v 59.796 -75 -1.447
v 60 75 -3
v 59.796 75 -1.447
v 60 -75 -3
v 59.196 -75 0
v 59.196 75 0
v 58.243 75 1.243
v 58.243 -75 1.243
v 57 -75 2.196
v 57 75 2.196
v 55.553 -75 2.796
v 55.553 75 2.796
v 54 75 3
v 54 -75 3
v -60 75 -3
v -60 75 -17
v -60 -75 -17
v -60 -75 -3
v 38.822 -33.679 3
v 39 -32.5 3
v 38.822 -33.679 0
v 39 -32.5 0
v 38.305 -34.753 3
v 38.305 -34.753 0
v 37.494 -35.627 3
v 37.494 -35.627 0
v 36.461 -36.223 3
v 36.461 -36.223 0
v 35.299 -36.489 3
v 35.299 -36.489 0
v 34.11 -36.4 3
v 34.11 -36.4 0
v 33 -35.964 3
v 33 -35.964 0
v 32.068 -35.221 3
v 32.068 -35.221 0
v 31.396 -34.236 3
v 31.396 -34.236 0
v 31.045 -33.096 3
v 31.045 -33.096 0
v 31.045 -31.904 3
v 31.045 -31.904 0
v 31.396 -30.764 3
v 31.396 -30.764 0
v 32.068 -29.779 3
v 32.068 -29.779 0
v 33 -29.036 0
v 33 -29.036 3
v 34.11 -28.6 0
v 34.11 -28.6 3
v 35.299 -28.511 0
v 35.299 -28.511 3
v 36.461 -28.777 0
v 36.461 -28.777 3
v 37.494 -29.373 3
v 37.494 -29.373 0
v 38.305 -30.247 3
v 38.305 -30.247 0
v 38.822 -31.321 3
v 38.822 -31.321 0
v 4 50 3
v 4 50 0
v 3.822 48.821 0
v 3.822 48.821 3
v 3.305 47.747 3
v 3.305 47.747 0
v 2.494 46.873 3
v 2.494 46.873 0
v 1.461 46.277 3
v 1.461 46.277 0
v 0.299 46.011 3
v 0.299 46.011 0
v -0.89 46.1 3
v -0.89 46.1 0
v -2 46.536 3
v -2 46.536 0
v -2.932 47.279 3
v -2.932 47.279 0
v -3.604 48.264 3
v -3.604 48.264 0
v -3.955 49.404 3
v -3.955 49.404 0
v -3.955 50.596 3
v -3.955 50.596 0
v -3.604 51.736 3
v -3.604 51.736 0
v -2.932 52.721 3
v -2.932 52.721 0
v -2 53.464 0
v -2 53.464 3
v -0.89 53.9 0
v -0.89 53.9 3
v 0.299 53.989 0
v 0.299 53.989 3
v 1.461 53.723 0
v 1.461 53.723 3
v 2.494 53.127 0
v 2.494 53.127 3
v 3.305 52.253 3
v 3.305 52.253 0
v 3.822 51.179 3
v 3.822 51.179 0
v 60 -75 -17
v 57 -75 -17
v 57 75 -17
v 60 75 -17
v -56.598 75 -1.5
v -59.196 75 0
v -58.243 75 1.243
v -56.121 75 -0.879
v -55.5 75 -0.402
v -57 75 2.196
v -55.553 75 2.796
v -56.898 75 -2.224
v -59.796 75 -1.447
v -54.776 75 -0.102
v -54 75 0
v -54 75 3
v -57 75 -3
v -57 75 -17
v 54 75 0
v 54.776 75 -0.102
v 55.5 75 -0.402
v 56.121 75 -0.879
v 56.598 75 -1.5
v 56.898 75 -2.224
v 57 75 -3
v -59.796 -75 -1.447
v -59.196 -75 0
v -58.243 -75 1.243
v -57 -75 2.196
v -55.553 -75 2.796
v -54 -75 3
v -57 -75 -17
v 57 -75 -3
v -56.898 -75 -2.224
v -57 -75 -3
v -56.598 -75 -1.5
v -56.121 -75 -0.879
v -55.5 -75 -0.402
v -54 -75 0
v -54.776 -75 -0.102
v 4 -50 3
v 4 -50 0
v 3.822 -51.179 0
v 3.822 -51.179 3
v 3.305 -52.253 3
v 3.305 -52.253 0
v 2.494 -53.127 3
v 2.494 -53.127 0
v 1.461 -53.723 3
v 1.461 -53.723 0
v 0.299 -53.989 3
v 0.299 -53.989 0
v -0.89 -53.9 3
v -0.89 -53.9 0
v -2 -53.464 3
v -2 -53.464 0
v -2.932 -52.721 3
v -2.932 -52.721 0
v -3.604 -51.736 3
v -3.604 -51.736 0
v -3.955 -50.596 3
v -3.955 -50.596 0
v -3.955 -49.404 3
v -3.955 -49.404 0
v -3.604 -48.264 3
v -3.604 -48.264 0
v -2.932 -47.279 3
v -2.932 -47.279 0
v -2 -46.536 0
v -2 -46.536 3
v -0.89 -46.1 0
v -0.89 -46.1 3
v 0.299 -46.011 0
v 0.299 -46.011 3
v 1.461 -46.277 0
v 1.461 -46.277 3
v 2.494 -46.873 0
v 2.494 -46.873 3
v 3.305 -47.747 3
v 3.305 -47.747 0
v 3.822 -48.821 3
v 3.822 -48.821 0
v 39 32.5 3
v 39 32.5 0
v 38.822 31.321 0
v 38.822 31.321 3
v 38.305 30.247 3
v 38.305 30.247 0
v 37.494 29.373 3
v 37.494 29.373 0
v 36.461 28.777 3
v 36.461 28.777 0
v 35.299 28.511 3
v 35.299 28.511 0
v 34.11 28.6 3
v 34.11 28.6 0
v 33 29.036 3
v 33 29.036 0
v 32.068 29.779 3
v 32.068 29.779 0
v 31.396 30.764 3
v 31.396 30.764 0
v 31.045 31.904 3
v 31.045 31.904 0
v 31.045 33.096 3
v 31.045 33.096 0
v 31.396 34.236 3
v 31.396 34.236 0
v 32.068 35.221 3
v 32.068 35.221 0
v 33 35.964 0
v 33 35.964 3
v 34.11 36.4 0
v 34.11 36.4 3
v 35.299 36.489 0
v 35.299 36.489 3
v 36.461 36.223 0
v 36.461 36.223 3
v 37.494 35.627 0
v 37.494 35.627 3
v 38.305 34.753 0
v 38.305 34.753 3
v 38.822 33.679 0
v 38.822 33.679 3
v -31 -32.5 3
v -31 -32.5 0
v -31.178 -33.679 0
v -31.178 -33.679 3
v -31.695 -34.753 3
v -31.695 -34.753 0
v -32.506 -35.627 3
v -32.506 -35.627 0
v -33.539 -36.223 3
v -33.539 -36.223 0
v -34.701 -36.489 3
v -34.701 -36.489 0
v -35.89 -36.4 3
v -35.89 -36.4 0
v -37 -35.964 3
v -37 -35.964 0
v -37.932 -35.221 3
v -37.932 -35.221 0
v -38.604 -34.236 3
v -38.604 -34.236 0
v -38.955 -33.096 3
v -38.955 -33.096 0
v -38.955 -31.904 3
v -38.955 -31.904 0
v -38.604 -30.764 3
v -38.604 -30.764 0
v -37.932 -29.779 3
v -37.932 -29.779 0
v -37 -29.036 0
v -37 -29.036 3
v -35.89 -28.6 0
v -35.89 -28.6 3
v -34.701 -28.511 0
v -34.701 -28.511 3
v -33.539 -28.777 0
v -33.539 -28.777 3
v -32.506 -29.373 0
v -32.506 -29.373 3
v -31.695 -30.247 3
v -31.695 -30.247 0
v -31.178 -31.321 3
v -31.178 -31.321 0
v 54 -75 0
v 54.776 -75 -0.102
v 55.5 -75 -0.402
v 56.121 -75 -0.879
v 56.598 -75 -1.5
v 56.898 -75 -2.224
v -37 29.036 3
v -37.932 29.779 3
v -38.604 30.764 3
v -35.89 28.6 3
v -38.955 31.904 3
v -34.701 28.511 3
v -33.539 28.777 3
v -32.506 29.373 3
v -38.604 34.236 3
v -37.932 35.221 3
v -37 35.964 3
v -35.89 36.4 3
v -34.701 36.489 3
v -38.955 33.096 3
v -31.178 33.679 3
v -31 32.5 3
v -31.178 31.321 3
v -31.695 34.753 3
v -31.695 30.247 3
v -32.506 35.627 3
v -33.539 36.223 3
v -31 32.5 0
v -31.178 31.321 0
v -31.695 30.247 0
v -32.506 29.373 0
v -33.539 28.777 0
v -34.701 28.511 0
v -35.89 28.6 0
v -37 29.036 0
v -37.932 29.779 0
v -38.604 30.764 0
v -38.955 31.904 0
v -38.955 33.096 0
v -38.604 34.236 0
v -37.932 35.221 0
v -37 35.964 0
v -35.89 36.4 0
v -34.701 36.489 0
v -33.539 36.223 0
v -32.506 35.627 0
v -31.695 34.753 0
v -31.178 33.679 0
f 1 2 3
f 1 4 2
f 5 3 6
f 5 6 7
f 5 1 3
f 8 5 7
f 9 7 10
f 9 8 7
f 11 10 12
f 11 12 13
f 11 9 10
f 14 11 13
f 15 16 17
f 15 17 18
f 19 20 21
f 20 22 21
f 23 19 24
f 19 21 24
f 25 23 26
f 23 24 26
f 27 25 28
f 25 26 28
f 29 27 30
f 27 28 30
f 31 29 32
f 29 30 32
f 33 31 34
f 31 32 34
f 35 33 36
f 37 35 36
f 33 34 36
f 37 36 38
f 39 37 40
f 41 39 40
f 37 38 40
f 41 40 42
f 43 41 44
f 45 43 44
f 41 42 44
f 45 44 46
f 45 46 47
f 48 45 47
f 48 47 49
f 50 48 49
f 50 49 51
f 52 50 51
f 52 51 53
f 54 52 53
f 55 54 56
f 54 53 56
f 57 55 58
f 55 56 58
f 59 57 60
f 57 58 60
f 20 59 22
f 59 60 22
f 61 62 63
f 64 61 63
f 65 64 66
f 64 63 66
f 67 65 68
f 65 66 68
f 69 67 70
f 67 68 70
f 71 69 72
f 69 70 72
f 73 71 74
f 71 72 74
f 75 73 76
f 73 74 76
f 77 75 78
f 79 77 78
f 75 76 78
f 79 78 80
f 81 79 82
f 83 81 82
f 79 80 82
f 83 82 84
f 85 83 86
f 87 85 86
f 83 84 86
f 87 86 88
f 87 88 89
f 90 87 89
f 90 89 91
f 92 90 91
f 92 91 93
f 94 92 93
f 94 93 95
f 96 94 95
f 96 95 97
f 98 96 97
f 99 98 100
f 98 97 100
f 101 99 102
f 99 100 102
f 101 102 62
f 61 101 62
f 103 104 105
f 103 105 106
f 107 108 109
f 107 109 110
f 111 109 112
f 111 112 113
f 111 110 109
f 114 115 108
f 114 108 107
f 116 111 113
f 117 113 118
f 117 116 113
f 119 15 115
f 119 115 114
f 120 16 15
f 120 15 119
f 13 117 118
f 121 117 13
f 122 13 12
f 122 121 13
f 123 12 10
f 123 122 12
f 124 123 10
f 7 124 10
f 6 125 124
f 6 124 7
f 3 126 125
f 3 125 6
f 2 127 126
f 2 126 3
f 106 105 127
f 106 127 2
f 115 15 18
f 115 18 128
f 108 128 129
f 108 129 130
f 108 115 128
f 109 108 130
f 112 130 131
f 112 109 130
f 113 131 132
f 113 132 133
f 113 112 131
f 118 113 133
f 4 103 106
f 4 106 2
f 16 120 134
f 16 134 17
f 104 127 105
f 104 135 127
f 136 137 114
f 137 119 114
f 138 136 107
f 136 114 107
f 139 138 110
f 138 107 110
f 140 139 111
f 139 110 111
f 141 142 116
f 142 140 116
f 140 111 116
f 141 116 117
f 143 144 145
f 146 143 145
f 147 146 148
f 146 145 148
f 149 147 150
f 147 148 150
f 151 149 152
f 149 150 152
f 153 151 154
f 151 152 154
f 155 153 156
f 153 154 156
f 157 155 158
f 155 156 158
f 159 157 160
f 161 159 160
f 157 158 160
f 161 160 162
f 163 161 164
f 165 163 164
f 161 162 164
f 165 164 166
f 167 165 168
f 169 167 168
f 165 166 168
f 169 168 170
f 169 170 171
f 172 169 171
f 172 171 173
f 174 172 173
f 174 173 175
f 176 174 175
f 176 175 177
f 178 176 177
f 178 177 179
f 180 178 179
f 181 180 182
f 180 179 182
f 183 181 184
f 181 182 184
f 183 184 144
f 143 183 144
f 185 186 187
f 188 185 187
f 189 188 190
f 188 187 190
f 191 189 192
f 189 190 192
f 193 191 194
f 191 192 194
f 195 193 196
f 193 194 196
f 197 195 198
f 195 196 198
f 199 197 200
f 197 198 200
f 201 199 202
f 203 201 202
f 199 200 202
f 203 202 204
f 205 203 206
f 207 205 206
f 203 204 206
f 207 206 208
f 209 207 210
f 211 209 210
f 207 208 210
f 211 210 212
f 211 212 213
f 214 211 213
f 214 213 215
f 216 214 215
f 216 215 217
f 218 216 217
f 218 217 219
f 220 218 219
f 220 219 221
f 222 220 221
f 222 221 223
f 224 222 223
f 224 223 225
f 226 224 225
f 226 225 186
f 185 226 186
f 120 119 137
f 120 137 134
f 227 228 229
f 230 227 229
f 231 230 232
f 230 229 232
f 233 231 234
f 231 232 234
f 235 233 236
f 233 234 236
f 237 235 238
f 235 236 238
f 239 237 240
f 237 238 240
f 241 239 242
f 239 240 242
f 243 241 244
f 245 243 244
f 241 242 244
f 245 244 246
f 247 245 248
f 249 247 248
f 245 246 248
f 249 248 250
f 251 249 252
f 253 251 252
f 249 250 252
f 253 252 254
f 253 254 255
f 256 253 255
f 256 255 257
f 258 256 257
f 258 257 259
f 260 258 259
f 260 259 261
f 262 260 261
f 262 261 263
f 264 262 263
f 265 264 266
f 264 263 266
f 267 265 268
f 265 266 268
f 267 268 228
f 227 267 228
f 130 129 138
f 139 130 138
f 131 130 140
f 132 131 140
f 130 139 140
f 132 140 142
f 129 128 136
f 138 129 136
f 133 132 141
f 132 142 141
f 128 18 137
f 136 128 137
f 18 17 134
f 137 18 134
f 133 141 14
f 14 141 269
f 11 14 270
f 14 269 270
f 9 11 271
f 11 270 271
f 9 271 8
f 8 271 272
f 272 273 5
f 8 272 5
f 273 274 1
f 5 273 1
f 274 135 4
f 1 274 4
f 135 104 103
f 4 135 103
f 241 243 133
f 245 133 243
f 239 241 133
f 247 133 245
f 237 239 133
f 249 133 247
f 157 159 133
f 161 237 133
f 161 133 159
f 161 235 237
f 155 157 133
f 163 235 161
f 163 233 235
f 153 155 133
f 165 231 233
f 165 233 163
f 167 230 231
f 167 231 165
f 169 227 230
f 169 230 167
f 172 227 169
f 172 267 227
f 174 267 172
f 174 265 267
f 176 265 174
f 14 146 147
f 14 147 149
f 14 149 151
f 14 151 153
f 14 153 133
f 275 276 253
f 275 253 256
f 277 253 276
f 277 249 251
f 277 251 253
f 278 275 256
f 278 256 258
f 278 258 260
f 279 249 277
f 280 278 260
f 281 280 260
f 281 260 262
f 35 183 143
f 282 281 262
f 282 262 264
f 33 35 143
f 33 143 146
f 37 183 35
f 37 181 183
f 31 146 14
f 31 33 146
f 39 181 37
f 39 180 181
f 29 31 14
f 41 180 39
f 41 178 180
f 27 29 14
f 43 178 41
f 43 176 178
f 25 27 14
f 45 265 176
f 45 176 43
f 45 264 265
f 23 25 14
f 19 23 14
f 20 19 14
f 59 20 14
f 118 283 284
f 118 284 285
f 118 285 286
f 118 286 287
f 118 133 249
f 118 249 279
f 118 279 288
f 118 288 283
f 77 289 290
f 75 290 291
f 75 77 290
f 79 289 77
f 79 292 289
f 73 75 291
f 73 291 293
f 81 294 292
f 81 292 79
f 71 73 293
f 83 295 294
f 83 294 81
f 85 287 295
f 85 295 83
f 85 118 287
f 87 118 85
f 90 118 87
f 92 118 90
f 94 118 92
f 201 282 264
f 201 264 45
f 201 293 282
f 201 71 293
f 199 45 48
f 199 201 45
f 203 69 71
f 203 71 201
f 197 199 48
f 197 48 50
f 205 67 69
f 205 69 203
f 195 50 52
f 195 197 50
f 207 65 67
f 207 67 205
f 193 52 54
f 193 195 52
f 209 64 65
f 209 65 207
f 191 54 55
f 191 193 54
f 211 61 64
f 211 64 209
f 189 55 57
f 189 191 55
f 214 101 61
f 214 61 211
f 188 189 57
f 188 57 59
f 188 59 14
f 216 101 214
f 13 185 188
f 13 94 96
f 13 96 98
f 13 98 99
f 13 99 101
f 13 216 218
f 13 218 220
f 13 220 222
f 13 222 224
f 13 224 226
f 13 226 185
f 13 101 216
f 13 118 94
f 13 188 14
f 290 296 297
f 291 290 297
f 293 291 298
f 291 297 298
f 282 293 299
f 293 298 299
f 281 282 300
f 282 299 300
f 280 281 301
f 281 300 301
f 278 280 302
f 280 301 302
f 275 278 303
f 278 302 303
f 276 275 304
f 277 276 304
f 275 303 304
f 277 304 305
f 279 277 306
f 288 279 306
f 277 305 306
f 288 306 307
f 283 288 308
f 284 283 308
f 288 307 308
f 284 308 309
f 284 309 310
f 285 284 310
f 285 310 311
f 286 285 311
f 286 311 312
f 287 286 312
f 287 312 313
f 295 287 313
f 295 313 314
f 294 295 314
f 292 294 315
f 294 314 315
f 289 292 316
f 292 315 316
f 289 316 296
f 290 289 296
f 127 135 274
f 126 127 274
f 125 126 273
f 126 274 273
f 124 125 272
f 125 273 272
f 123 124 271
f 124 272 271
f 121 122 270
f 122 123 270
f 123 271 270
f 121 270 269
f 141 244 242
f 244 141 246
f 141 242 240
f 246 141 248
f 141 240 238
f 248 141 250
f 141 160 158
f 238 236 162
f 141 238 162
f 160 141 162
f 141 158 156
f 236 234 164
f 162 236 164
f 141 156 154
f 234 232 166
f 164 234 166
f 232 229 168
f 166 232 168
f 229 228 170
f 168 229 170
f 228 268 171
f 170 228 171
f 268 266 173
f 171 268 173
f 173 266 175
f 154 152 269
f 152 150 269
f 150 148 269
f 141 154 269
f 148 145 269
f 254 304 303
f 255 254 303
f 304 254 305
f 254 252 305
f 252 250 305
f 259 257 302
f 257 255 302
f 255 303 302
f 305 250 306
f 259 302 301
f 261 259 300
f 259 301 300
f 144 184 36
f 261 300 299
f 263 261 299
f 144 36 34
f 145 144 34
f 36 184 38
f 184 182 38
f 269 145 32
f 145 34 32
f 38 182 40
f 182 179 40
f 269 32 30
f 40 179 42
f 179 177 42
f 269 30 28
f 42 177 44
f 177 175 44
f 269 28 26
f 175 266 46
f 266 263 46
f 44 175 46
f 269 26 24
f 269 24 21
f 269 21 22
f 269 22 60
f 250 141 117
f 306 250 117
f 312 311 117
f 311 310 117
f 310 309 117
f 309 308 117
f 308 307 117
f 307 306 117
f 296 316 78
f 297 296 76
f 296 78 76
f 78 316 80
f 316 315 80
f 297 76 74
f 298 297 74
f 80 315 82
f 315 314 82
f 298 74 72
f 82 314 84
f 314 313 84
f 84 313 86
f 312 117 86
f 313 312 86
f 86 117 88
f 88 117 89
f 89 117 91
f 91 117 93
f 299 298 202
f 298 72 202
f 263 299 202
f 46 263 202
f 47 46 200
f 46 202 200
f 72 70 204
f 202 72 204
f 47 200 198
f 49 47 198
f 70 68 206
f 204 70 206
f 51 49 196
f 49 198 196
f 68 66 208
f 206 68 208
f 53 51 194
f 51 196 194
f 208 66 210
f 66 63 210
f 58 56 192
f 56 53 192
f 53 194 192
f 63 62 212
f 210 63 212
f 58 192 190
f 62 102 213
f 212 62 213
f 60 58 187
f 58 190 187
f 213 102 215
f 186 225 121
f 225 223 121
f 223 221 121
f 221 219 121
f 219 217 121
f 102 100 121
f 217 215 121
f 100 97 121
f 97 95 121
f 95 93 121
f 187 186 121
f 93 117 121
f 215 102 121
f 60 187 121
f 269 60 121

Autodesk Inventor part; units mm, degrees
ref_plane "YZ Plane" through (0, 0, 0) normal (1, 0, 0) x (0, 1, 0)
ref_plane "XZ Plane" through (0, 0, 0) normal (0, 1, 0) x (-1, 0, 0)
ref_plane "XY Plane" through (0, 0, 0) normal (0, 0, 1) x (1, 0, 0)
sketch "Sketch1" plane through (0, 0, 0) normal (0, 0, 1) x (1, 0, 0)
  line L0 (60, -75) -> (-60, -75)
  line L1 (-60, -75) -> (-60, 75)
  line L2 (-60, 75) -> (60, 75)
  line L3 (60, 75) -> (60, -75)
  line L4 (60, 75) -> (-60, -75) construction
  point P0 (0, 0)
  point P1 (0, 0)
  dimension "d1" = 150
  dimension "d2" = 120
extrude "Plate1" add sketch "Sketch1" along normal blind 3
sketch "Sketch2" plane through (0, 0, 0) normal (0, 0, 1) x (1, 0, 0)
  circle A0 centre (0, 0) radius 17.5
  line L0 (35, -32.5) -> (-35, -32.5) construction
  line L1 (-35, -32.5) -> (-35, 32.5) construction
  line L2 (-35, 32.5) -> (35, 32.5) construction
  line L3 (35, 32.5) -> (35, -32.5) construction
  line L4 (35, -32.5) -> (-35, 32.5) construction
  line L5 (-35, -32.5) -> (35, 32.5) construction
  circle A1 centre (-35, -32.5) radius 4
  circle A2 centre (35, -32.5) radius 4
  circle A3 centre (35, 32.5) radius 4
  circle A4 centre (-35, 32.5) radius 4
  circle A5 centre (0, 50) radius 4
  circle A6 centre (0, -50) radius 4
  line L6 (35, 0) -> (-35, 0) construction
  point P0 (75, 0)
  point P1 (0, 0)
  dimension "d3" = 35
  dimension "d4" = 70
  dimension "d5" = 65
  dimension "d7" = 8
  dimension "d32" = 100
extrude "Extrusion1" cut sketch "Sketch2" along normal through all contours A1 | A2 | A3 | A4 | A5 | A6
sketch "Sketch3" plane through (-57, 75, 3) normal (-1, 0, 0) x (0, -1, 0)
  line L0 (150, 0) -> (0, 0)
  line L1 (0, 0) -> (0, -20)
  line L2 (0, -20) -> (150, -20)
  line L3 (150, -20) -> (150, 0)
edge flange "Flange1" height 20 angle 90 thickness 3 bend radius 3 thickness toward (-1, 0, 0) relief tear relief width 3 relief depth 1.5 corner gap 3 corner form 0 edges at (-60, 0, 0) (60, 0, 0) wall of the first edge with corners at (-57, -75, 3) (-57, 75, 3) (-57, 75, -17) (-57, -75, -17)
bend "Bend1"
corner "Corner1"
sketch "Sketch4" plane through (0, 0, 0) normal (0, 0, 1) x (1, 0, 0)
  circle A0 centre (0, 75) radius 17.5 projected
  line L0 (0, 125) -> (0, 105) construction
  line L1 (-3, 125) -> (-3, 105)
  line L2 (3, 105) -> (3, 125)
  arc A1 (3, 125) -> (-3, 125) centre (0, 125) ccw
  arc A2 (-3, 105) -> (3, 105) centre (0, 105) ccw
  arc A3 (34.641, 95) -> (20, 109.641) centre (0, 75) ccw construction
  arc A4 (37.2391, 96.5) -> (21.5, 112.2391) centre (0, 75) ccw
  arc A5 (32.0429, 93.5) -> (18.5, 107.0429) centre (0, 75) ccw
  arc A6 (32.0429, 93.5) -> (37.2391, 96.5) centre (34.641, 95) ccw
  arc A7 (21.5, 112.2391) -> (18.5, 107.0429) centre (20, 109.641) ccw
  line L3 (0, 75) -> (20, 109.641) construction
  line L4 (0, 75) -> (40, 75) construction
  line L5 (0, 75) -> (34.641, 95) construction
  point P0 (0, 0)
  point P1 (0, 115)
  dimension "d20" = 20
  dimension "d21" = 6
  dimension "d22" = 30
  dimension "d23" = 60
  dimension "d24" = 30
  dimension "d25" = 6
  dimension "d26" = 40
extrude "Extrusion2" [suppressed]
pattern_circular "Circular Pattern1" [suppressed]
equation "\"d0\" = Thickness"
equation "\"d10\" = BendReliefWidth"
equation "\"d11\" = BendReliefDepth"
equation "\"d12\" = MinimumRemnant"
equation "\"d13\" = TransitionRadius"
equation "\"d16\" = BendRadius"
equation "\"d17\" = CornerReliefSize"
equation "\"d18\" = GapSize"
equation "\"d19\" = JacobiRadiusSize"
equation "\"BendRadius\" = Thickness"
equation "\"BendReliefWidth\" = Thickness"
equation "\"BendReliefDepth\" = 0.5 * Thickness"
equation "\"CornerReliefSize\" = 4 * Thickness"
equation "\"MinimumRemnant\" = 2 * Thickness"
equation "\"TransitionRadius\" = BendRadius"
equation "\"JacobiRadiusSize\" = BendRadius"
equation "\"GapSize\" = Thickness"
equation "\"Thickness\" = 3"
properties part number "FL3.6.2  Motor pillar" material "Stainless Steel"
